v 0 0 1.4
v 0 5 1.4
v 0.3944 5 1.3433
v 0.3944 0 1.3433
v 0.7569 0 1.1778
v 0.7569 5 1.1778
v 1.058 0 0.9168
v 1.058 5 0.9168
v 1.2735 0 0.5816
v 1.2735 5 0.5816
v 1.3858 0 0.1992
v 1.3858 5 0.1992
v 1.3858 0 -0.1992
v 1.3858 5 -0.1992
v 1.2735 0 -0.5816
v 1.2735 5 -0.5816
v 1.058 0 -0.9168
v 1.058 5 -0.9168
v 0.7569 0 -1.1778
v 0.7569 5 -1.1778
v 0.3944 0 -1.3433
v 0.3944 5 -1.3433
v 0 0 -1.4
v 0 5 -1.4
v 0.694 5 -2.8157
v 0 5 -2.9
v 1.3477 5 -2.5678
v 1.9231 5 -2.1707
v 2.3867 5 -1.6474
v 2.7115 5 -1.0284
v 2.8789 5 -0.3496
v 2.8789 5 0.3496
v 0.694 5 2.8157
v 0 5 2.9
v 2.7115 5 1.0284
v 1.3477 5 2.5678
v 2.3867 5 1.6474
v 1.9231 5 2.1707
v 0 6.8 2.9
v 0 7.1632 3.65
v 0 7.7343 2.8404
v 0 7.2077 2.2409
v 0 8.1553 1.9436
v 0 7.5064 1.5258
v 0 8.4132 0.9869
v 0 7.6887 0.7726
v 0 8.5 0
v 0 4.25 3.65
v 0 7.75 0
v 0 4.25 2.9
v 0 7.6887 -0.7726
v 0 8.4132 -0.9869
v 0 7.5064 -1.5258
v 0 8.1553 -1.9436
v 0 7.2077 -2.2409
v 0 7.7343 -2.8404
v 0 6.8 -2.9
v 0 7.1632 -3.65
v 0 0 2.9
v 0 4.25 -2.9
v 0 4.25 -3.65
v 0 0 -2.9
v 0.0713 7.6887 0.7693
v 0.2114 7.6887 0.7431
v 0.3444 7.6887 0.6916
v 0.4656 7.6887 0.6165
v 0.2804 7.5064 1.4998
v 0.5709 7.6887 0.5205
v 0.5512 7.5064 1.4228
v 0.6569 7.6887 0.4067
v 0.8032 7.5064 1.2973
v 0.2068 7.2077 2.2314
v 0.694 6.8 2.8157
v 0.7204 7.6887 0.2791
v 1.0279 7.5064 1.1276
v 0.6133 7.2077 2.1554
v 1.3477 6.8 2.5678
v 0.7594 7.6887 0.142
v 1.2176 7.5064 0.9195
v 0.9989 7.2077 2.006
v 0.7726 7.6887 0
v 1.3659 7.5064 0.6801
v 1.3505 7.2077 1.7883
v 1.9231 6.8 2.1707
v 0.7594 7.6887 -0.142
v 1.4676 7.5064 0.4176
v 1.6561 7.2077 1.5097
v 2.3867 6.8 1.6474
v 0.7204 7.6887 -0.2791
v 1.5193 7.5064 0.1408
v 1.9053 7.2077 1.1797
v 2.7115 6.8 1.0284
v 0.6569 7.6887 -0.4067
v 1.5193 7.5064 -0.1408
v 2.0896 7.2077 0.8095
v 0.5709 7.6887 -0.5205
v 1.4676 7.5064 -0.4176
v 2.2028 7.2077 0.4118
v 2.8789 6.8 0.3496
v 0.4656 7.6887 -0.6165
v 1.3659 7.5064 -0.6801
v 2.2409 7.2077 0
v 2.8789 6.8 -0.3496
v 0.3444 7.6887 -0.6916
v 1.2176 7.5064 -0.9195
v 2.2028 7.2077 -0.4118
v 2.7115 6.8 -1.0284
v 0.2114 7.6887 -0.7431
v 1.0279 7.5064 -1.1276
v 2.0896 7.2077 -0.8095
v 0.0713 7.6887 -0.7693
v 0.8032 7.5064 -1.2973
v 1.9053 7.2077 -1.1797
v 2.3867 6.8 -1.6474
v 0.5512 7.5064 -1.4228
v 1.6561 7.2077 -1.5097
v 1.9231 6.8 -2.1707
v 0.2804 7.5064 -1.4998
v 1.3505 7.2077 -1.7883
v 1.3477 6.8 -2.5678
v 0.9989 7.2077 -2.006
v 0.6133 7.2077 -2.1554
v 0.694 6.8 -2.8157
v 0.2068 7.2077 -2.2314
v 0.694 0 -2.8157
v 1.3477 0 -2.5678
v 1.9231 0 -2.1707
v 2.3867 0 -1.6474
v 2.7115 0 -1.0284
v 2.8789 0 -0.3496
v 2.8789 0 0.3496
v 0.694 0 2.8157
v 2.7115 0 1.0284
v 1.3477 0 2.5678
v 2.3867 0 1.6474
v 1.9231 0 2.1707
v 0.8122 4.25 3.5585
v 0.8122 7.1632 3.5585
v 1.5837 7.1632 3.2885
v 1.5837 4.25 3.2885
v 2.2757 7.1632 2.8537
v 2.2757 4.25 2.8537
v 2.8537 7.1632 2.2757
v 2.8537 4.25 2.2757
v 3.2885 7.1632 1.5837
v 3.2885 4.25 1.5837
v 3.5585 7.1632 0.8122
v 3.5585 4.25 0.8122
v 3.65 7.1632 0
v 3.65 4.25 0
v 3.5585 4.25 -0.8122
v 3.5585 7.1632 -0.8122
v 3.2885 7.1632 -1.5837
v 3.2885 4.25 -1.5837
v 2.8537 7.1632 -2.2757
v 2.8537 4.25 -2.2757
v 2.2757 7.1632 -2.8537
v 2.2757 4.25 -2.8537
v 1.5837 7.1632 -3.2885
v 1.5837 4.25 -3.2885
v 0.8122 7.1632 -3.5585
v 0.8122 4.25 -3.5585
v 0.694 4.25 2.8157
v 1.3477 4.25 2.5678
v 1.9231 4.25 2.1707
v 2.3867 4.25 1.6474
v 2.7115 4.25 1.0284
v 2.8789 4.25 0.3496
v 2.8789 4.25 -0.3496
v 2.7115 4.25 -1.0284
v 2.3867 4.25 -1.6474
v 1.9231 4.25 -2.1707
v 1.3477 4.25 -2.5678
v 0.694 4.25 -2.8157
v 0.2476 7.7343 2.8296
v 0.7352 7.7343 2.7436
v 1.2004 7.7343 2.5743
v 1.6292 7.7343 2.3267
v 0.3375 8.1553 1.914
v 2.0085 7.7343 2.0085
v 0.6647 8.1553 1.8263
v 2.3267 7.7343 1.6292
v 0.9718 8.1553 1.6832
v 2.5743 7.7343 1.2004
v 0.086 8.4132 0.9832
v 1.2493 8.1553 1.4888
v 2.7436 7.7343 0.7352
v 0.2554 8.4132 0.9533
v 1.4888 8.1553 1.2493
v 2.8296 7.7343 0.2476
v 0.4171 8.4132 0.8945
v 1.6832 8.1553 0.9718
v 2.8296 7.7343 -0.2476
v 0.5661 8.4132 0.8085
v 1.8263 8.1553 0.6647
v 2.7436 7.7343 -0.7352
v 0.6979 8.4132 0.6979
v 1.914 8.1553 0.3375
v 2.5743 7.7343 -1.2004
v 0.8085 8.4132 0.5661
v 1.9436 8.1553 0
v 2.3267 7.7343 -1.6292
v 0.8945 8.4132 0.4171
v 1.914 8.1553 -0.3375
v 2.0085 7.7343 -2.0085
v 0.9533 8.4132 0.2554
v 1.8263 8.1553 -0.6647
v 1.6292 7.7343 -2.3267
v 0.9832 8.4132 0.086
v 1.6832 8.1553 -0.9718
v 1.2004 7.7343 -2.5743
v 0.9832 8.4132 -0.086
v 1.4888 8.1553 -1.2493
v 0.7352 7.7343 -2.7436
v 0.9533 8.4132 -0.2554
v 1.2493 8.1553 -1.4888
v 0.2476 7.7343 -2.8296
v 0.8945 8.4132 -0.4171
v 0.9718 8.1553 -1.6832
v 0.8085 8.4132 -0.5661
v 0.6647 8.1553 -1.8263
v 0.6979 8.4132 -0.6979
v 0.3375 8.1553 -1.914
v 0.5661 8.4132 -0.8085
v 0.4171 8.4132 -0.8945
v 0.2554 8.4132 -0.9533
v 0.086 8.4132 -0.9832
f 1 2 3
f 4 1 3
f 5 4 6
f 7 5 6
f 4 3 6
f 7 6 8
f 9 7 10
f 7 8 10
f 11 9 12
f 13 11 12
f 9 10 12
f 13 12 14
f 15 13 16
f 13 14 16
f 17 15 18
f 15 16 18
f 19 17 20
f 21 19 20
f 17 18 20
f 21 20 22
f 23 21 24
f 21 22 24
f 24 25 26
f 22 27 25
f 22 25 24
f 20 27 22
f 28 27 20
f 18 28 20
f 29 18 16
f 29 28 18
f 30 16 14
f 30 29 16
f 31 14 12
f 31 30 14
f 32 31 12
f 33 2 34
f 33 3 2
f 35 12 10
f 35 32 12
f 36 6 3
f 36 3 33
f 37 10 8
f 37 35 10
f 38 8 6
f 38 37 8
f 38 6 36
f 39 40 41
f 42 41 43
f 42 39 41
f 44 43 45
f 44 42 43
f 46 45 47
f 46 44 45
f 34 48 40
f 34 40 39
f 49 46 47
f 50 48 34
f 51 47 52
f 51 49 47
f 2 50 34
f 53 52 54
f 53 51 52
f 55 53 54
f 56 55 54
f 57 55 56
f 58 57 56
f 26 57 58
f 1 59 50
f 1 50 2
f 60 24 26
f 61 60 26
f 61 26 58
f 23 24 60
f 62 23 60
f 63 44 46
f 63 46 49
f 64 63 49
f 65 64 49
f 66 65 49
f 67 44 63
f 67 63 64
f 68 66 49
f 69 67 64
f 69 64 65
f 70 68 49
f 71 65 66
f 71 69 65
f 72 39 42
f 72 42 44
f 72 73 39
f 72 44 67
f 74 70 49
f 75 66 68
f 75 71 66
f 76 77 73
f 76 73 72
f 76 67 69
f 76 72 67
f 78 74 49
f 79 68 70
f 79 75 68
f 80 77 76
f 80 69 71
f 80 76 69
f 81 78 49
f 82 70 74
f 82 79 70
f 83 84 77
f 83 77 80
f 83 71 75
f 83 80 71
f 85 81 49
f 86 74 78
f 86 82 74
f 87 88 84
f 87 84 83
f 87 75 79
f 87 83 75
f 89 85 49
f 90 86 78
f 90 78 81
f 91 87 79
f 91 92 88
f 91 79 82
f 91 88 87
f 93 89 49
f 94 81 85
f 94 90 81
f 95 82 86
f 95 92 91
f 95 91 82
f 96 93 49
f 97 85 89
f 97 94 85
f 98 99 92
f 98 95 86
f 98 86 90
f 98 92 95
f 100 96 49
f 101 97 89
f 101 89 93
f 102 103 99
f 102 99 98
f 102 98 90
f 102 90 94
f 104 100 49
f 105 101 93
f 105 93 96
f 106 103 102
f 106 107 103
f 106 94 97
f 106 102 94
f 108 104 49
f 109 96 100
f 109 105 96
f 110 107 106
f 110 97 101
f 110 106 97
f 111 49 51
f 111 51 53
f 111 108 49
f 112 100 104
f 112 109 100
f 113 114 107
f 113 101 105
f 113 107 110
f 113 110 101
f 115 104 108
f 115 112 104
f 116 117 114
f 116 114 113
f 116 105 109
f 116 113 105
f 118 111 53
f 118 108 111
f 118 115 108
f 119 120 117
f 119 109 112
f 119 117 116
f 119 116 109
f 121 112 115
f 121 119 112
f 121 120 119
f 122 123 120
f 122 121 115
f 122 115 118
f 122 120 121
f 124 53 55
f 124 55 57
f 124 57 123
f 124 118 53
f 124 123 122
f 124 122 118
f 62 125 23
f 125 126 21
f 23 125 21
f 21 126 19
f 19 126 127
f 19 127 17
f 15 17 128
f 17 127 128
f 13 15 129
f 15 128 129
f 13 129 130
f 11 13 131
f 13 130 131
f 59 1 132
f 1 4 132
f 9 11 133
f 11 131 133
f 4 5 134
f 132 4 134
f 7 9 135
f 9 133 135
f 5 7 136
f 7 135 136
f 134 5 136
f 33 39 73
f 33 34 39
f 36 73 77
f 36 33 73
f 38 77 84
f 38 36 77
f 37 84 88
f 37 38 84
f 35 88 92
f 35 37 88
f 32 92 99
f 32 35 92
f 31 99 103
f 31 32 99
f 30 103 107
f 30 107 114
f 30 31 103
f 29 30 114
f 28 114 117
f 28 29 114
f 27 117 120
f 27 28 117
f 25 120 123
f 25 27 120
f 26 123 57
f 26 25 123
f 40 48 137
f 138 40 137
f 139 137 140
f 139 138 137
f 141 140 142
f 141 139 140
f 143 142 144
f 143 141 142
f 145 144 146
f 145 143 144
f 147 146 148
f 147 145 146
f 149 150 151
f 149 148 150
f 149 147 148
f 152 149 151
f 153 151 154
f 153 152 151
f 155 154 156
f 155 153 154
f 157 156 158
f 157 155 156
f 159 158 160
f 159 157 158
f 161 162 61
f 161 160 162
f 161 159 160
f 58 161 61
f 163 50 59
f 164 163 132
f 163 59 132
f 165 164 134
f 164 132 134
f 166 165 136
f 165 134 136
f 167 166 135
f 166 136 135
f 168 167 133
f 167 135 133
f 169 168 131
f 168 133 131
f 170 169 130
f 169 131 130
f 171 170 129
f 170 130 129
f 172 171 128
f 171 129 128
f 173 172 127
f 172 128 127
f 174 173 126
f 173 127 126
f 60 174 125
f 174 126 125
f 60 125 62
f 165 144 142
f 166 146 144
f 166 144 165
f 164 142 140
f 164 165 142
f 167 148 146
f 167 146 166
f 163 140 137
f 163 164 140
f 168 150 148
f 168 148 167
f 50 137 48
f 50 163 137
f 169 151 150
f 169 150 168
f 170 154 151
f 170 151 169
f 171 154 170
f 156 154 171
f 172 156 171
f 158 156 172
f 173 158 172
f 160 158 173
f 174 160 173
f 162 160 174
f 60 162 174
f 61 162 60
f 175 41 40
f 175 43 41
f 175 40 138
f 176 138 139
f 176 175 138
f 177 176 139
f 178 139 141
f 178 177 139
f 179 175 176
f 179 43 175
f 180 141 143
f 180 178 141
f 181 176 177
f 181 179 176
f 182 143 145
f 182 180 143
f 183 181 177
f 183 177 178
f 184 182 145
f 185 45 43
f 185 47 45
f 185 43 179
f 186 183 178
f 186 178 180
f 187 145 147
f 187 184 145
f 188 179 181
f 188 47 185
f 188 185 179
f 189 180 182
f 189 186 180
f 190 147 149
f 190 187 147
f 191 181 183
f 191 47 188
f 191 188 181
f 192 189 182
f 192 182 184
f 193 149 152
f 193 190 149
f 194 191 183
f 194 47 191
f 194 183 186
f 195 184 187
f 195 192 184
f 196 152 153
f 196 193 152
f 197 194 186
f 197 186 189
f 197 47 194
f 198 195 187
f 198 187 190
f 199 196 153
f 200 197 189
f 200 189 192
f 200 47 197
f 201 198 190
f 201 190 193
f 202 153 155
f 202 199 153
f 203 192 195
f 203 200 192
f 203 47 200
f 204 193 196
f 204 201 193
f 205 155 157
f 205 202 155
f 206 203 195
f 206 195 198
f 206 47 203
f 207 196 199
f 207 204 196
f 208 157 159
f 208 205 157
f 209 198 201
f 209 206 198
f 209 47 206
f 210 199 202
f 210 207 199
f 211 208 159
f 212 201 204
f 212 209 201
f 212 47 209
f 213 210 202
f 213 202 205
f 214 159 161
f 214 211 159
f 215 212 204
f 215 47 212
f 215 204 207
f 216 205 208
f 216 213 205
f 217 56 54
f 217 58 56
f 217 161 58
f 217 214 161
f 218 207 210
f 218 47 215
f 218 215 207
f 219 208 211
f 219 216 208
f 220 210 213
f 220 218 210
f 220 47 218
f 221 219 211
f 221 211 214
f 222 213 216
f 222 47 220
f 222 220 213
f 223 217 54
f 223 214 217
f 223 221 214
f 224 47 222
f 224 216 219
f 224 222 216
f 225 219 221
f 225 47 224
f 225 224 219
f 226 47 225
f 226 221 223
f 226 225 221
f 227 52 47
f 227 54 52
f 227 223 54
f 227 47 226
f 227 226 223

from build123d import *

# Parameters (mm, degrees)
SKETCH1_R           = 2.9
BOSS_EXTRUDE1_DEPTH = 5
CUT_EXTRUDE1_REACH  = 8.467
SKETCH2_R           = 1.4
CUT_EXTRUDE2_REACH  = 11.945
SKETCH8_W           = 3.65
SKETCH8_H           = 7.3


with BuildPart() as part:
    # Sketch1 → Boss-Extrude1 (new body)
    with BuildSketch(Plane(origin=(0, 0, 0), x_dir=(1, 0, 0), z_dir=(0, 1, 0))):
        with Locations(Location((0, 0, 0), (0, 0, 270))):
            Circle(SKETCH1_R)
    extrude(amount=BOSS_EXTRUDE1_DEPTH)

    # Sketch2 → Cut-Extrude1 (cut, up to next)
    with BuildSketch(Plane(origin=(0, 5, 0), x_dir=(1, 0, 0), z_dir=(0, 1, 0)), mode=Mode.PRIVATE) as cut_extrude1_sk1:
        with Locations(Location((0, 0, 0), (0, 0, 270))):
            Circle(SKETCH2_R)
    cut_extrude1_tool1 = extrude(cut_extrude1_sk1.sketch, amount=-CUT_EXTRUDE1_REACH, mode=Mode.PRIVATE) & part.part
    add(cut_extrude1_tool1.solids().sort_by_distance((0, 5, 0))[0], mode=Mode.SUBTRACT)

    # Sketch6 → Revolve2 (revolve)
    with BuildSketch(Plane.XY):
        with BuildLine():
            Line((2.9, 6.8), (2.9, 5))
            Line((2.9, 5), (2.9, 4.25))
            Line((2.9, 4.25), (3.65, 4.25))
            Line((3.65, 4.25), (3.65, 5))
            Line((3.65, 5), (3.65, 7.163179564))
            ThreePointArc((3.65, 7.163179564), (1.943552731, 8.155281325), (0, 8.5))
            Line((0, 8.5), (0, 7.75))
            ThreePointArc((0, 7.75), (1.525819452, 7.506448853), (2.9, 6.8))
        make_face()
    revolve(axis=Axis((0, 5, 0), (0, 1, 0)))

    # Sketch8 → Cut-Extrude2 (cut, up to next)
    with BuildSketch(Plane(origin=(0, 0, 0), x_dir=(1, 0, 0), z_dir=(0, 1, 0)), mode=Mode.PRIVATE) as cut_extrude2_sk1:
        with Locations((-1.825, 0)):
            Rectangle(SKETCH8_W, SKETCH8_H)
    cut_extrude2_tool1 = extrude(cut_extrude2_sk1.sketch, amount=CUT_EXTRUDE2_REACH, mode=Mode.PRIVATE) & part.part
    add(cut_extrude2_tool1.solids().sort_by_distance((-1.825, 0, 0))[0], mode=Mode.SUBTRACT)


solid = part.part
